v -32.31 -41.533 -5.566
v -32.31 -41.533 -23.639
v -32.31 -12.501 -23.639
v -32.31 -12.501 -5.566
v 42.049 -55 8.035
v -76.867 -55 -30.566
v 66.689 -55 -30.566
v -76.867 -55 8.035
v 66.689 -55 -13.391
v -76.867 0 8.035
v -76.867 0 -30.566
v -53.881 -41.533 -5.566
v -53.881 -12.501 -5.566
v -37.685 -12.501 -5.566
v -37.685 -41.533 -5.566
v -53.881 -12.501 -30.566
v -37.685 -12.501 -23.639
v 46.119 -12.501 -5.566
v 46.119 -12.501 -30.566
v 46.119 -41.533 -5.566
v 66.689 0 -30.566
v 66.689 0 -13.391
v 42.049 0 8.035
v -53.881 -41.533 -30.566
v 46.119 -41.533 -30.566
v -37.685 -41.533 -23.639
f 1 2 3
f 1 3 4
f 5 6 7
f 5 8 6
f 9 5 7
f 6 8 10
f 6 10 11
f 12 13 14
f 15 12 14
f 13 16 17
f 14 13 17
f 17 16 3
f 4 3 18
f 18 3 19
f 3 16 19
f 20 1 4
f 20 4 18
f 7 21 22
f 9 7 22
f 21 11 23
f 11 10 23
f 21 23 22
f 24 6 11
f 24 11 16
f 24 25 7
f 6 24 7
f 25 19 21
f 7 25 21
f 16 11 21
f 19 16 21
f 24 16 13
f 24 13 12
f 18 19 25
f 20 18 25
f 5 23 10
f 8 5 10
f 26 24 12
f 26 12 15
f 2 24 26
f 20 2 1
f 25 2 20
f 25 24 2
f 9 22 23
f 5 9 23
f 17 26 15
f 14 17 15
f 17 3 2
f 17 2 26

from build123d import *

# Parameters (mm, degrees)
F1_DEPTH = 55
F2_W     = 100
F2_H     = 29.0322554066
F3_DEPTH = 25
F4_W     = 5.3750351071
F4_H     = 18.072870967
F5_DEPTH = 29.0322554066


with BuildPart() as f1:
    # F0 (on Front) → F1 (new body)
    with BuildSketch(Plane.XZ):
        Polygon((-76.8667086959, -30.5658673523), (66.6892379522, -30.5658673523), (66.6892379522, -13.3914127946), (42.04903543, 8.0348476768), (-76.8667086959, 8.0348476768), align=None)
    extrude(amount=F1_DEPTH)

    # F2 (on face) → F3 (cut)
    with BuildSketch(Plane(origin=(0, 0, -30.5658673523), x_dir=(1, 0, 0), z_dir=(0, 0, -1))):
        with Locations((-3.8809403777, 27.016880922)):
            Rectangle(F2_W, F2_H)
    extrude(amount=-F3_DEPTH, mode=Mode.SUBTRACT)

    # F4 (on face) → F5 (join, through all)
    with BuildSketch(Plane(origin=(0, -41.5330086253, 0), x_dir=(-1, 0, 0), z_dir=(0, 1, 0))):
        with Locations((34.9972322583, -14.6023028358)):
            Rectangle(F4_W, F4_H)
    extrude(amount=F5_DEPTH)


solid = f1.part
